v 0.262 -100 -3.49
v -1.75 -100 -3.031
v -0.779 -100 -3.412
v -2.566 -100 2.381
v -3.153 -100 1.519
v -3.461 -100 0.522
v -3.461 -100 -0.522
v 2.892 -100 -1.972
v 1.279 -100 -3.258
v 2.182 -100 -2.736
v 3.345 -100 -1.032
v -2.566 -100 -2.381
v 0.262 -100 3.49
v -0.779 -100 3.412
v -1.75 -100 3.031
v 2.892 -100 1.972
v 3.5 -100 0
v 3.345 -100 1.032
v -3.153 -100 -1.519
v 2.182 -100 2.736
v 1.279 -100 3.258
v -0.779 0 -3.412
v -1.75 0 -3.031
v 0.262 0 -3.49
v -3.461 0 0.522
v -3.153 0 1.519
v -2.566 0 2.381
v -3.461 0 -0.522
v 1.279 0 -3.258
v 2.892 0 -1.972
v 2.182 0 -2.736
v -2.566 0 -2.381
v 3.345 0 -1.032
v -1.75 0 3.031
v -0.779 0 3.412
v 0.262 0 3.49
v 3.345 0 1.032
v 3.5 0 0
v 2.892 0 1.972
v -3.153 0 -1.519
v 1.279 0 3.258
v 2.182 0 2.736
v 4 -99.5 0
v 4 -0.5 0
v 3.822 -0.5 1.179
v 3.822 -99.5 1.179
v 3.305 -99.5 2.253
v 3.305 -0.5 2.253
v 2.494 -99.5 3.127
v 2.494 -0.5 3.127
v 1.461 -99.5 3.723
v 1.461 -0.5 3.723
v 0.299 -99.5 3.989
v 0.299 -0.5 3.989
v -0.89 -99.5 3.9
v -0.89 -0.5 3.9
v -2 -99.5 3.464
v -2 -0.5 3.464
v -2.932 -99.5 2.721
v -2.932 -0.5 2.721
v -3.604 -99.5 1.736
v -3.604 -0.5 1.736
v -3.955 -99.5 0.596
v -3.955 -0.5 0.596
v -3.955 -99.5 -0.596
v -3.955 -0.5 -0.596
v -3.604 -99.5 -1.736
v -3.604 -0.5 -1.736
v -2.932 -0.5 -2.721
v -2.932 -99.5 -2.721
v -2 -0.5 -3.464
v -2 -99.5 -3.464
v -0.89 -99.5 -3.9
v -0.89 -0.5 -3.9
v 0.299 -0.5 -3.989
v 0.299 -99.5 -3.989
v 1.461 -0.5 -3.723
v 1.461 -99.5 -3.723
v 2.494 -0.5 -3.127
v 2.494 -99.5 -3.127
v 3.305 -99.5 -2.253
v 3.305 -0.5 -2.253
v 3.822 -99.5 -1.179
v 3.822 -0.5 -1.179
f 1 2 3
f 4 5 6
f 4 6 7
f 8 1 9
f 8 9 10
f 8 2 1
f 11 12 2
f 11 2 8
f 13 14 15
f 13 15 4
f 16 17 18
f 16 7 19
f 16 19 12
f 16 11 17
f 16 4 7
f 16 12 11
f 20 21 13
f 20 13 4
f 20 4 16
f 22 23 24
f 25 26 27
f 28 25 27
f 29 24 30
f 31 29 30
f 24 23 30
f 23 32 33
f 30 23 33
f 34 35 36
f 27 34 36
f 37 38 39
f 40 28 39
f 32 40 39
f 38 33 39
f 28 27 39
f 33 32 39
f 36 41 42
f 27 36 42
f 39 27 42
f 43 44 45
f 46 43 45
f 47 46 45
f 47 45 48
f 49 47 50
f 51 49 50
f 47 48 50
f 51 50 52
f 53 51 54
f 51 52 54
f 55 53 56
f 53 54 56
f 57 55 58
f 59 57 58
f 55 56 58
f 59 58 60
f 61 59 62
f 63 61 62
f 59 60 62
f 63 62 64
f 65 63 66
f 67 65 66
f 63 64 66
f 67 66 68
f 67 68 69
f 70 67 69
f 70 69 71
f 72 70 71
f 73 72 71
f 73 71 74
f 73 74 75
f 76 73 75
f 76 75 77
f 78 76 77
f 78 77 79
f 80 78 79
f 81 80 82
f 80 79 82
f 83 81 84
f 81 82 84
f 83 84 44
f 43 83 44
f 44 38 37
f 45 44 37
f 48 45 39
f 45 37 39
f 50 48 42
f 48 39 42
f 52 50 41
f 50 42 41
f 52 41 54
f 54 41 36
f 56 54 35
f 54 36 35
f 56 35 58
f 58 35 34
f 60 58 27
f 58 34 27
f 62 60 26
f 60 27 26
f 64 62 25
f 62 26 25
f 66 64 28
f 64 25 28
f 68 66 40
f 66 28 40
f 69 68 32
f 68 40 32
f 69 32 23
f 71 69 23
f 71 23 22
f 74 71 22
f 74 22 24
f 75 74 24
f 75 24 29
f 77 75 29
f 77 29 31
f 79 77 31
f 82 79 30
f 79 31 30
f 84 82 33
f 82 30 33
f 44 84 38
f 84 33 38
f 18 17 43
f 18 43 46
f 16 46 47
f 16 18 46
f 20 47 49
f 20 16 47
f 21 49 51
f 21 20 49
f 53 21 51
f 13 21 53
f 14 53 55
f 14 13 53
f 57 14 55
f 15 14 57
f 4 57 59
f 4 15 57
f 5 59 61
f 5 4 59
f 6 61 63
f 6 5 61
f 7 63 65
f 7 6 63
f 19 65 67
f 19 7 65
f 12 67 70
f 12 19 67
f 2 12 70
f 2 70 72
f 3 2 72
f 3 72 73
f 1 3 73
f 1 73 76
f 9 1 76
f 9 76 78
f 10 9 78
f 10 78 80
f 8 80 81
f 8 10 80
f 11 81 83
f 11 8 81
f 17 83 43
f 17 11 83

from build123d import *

# Parameters (mm, degrees)
F0_R     = 4
F1_DEPTH = 100
F2_SIZE  = 0.5
F3_SIZE  = 0.5


with BuildPart() as f1:
    # F0 (on Front) → F1 (new body)
    with BuildSketch(Plane.XZ):
        Circle(F0_R)
    extrude(amount=F1_DEPTH)

    # F2
    f2_edges = [f1.edges().sort_by_distance(p)[0] for p in [
        (-4, 0, 0),
    ]]
    chamfer(f2_edges, length=F2_SIZE)

    # F3
    f3_edges = [f1.edges().sort_by_distance(p)[0] for p in [
        (-4, -100, 0),
    ]]
    chamfer(f3_edges, length=F3_SIZE)


solid = f1.part
